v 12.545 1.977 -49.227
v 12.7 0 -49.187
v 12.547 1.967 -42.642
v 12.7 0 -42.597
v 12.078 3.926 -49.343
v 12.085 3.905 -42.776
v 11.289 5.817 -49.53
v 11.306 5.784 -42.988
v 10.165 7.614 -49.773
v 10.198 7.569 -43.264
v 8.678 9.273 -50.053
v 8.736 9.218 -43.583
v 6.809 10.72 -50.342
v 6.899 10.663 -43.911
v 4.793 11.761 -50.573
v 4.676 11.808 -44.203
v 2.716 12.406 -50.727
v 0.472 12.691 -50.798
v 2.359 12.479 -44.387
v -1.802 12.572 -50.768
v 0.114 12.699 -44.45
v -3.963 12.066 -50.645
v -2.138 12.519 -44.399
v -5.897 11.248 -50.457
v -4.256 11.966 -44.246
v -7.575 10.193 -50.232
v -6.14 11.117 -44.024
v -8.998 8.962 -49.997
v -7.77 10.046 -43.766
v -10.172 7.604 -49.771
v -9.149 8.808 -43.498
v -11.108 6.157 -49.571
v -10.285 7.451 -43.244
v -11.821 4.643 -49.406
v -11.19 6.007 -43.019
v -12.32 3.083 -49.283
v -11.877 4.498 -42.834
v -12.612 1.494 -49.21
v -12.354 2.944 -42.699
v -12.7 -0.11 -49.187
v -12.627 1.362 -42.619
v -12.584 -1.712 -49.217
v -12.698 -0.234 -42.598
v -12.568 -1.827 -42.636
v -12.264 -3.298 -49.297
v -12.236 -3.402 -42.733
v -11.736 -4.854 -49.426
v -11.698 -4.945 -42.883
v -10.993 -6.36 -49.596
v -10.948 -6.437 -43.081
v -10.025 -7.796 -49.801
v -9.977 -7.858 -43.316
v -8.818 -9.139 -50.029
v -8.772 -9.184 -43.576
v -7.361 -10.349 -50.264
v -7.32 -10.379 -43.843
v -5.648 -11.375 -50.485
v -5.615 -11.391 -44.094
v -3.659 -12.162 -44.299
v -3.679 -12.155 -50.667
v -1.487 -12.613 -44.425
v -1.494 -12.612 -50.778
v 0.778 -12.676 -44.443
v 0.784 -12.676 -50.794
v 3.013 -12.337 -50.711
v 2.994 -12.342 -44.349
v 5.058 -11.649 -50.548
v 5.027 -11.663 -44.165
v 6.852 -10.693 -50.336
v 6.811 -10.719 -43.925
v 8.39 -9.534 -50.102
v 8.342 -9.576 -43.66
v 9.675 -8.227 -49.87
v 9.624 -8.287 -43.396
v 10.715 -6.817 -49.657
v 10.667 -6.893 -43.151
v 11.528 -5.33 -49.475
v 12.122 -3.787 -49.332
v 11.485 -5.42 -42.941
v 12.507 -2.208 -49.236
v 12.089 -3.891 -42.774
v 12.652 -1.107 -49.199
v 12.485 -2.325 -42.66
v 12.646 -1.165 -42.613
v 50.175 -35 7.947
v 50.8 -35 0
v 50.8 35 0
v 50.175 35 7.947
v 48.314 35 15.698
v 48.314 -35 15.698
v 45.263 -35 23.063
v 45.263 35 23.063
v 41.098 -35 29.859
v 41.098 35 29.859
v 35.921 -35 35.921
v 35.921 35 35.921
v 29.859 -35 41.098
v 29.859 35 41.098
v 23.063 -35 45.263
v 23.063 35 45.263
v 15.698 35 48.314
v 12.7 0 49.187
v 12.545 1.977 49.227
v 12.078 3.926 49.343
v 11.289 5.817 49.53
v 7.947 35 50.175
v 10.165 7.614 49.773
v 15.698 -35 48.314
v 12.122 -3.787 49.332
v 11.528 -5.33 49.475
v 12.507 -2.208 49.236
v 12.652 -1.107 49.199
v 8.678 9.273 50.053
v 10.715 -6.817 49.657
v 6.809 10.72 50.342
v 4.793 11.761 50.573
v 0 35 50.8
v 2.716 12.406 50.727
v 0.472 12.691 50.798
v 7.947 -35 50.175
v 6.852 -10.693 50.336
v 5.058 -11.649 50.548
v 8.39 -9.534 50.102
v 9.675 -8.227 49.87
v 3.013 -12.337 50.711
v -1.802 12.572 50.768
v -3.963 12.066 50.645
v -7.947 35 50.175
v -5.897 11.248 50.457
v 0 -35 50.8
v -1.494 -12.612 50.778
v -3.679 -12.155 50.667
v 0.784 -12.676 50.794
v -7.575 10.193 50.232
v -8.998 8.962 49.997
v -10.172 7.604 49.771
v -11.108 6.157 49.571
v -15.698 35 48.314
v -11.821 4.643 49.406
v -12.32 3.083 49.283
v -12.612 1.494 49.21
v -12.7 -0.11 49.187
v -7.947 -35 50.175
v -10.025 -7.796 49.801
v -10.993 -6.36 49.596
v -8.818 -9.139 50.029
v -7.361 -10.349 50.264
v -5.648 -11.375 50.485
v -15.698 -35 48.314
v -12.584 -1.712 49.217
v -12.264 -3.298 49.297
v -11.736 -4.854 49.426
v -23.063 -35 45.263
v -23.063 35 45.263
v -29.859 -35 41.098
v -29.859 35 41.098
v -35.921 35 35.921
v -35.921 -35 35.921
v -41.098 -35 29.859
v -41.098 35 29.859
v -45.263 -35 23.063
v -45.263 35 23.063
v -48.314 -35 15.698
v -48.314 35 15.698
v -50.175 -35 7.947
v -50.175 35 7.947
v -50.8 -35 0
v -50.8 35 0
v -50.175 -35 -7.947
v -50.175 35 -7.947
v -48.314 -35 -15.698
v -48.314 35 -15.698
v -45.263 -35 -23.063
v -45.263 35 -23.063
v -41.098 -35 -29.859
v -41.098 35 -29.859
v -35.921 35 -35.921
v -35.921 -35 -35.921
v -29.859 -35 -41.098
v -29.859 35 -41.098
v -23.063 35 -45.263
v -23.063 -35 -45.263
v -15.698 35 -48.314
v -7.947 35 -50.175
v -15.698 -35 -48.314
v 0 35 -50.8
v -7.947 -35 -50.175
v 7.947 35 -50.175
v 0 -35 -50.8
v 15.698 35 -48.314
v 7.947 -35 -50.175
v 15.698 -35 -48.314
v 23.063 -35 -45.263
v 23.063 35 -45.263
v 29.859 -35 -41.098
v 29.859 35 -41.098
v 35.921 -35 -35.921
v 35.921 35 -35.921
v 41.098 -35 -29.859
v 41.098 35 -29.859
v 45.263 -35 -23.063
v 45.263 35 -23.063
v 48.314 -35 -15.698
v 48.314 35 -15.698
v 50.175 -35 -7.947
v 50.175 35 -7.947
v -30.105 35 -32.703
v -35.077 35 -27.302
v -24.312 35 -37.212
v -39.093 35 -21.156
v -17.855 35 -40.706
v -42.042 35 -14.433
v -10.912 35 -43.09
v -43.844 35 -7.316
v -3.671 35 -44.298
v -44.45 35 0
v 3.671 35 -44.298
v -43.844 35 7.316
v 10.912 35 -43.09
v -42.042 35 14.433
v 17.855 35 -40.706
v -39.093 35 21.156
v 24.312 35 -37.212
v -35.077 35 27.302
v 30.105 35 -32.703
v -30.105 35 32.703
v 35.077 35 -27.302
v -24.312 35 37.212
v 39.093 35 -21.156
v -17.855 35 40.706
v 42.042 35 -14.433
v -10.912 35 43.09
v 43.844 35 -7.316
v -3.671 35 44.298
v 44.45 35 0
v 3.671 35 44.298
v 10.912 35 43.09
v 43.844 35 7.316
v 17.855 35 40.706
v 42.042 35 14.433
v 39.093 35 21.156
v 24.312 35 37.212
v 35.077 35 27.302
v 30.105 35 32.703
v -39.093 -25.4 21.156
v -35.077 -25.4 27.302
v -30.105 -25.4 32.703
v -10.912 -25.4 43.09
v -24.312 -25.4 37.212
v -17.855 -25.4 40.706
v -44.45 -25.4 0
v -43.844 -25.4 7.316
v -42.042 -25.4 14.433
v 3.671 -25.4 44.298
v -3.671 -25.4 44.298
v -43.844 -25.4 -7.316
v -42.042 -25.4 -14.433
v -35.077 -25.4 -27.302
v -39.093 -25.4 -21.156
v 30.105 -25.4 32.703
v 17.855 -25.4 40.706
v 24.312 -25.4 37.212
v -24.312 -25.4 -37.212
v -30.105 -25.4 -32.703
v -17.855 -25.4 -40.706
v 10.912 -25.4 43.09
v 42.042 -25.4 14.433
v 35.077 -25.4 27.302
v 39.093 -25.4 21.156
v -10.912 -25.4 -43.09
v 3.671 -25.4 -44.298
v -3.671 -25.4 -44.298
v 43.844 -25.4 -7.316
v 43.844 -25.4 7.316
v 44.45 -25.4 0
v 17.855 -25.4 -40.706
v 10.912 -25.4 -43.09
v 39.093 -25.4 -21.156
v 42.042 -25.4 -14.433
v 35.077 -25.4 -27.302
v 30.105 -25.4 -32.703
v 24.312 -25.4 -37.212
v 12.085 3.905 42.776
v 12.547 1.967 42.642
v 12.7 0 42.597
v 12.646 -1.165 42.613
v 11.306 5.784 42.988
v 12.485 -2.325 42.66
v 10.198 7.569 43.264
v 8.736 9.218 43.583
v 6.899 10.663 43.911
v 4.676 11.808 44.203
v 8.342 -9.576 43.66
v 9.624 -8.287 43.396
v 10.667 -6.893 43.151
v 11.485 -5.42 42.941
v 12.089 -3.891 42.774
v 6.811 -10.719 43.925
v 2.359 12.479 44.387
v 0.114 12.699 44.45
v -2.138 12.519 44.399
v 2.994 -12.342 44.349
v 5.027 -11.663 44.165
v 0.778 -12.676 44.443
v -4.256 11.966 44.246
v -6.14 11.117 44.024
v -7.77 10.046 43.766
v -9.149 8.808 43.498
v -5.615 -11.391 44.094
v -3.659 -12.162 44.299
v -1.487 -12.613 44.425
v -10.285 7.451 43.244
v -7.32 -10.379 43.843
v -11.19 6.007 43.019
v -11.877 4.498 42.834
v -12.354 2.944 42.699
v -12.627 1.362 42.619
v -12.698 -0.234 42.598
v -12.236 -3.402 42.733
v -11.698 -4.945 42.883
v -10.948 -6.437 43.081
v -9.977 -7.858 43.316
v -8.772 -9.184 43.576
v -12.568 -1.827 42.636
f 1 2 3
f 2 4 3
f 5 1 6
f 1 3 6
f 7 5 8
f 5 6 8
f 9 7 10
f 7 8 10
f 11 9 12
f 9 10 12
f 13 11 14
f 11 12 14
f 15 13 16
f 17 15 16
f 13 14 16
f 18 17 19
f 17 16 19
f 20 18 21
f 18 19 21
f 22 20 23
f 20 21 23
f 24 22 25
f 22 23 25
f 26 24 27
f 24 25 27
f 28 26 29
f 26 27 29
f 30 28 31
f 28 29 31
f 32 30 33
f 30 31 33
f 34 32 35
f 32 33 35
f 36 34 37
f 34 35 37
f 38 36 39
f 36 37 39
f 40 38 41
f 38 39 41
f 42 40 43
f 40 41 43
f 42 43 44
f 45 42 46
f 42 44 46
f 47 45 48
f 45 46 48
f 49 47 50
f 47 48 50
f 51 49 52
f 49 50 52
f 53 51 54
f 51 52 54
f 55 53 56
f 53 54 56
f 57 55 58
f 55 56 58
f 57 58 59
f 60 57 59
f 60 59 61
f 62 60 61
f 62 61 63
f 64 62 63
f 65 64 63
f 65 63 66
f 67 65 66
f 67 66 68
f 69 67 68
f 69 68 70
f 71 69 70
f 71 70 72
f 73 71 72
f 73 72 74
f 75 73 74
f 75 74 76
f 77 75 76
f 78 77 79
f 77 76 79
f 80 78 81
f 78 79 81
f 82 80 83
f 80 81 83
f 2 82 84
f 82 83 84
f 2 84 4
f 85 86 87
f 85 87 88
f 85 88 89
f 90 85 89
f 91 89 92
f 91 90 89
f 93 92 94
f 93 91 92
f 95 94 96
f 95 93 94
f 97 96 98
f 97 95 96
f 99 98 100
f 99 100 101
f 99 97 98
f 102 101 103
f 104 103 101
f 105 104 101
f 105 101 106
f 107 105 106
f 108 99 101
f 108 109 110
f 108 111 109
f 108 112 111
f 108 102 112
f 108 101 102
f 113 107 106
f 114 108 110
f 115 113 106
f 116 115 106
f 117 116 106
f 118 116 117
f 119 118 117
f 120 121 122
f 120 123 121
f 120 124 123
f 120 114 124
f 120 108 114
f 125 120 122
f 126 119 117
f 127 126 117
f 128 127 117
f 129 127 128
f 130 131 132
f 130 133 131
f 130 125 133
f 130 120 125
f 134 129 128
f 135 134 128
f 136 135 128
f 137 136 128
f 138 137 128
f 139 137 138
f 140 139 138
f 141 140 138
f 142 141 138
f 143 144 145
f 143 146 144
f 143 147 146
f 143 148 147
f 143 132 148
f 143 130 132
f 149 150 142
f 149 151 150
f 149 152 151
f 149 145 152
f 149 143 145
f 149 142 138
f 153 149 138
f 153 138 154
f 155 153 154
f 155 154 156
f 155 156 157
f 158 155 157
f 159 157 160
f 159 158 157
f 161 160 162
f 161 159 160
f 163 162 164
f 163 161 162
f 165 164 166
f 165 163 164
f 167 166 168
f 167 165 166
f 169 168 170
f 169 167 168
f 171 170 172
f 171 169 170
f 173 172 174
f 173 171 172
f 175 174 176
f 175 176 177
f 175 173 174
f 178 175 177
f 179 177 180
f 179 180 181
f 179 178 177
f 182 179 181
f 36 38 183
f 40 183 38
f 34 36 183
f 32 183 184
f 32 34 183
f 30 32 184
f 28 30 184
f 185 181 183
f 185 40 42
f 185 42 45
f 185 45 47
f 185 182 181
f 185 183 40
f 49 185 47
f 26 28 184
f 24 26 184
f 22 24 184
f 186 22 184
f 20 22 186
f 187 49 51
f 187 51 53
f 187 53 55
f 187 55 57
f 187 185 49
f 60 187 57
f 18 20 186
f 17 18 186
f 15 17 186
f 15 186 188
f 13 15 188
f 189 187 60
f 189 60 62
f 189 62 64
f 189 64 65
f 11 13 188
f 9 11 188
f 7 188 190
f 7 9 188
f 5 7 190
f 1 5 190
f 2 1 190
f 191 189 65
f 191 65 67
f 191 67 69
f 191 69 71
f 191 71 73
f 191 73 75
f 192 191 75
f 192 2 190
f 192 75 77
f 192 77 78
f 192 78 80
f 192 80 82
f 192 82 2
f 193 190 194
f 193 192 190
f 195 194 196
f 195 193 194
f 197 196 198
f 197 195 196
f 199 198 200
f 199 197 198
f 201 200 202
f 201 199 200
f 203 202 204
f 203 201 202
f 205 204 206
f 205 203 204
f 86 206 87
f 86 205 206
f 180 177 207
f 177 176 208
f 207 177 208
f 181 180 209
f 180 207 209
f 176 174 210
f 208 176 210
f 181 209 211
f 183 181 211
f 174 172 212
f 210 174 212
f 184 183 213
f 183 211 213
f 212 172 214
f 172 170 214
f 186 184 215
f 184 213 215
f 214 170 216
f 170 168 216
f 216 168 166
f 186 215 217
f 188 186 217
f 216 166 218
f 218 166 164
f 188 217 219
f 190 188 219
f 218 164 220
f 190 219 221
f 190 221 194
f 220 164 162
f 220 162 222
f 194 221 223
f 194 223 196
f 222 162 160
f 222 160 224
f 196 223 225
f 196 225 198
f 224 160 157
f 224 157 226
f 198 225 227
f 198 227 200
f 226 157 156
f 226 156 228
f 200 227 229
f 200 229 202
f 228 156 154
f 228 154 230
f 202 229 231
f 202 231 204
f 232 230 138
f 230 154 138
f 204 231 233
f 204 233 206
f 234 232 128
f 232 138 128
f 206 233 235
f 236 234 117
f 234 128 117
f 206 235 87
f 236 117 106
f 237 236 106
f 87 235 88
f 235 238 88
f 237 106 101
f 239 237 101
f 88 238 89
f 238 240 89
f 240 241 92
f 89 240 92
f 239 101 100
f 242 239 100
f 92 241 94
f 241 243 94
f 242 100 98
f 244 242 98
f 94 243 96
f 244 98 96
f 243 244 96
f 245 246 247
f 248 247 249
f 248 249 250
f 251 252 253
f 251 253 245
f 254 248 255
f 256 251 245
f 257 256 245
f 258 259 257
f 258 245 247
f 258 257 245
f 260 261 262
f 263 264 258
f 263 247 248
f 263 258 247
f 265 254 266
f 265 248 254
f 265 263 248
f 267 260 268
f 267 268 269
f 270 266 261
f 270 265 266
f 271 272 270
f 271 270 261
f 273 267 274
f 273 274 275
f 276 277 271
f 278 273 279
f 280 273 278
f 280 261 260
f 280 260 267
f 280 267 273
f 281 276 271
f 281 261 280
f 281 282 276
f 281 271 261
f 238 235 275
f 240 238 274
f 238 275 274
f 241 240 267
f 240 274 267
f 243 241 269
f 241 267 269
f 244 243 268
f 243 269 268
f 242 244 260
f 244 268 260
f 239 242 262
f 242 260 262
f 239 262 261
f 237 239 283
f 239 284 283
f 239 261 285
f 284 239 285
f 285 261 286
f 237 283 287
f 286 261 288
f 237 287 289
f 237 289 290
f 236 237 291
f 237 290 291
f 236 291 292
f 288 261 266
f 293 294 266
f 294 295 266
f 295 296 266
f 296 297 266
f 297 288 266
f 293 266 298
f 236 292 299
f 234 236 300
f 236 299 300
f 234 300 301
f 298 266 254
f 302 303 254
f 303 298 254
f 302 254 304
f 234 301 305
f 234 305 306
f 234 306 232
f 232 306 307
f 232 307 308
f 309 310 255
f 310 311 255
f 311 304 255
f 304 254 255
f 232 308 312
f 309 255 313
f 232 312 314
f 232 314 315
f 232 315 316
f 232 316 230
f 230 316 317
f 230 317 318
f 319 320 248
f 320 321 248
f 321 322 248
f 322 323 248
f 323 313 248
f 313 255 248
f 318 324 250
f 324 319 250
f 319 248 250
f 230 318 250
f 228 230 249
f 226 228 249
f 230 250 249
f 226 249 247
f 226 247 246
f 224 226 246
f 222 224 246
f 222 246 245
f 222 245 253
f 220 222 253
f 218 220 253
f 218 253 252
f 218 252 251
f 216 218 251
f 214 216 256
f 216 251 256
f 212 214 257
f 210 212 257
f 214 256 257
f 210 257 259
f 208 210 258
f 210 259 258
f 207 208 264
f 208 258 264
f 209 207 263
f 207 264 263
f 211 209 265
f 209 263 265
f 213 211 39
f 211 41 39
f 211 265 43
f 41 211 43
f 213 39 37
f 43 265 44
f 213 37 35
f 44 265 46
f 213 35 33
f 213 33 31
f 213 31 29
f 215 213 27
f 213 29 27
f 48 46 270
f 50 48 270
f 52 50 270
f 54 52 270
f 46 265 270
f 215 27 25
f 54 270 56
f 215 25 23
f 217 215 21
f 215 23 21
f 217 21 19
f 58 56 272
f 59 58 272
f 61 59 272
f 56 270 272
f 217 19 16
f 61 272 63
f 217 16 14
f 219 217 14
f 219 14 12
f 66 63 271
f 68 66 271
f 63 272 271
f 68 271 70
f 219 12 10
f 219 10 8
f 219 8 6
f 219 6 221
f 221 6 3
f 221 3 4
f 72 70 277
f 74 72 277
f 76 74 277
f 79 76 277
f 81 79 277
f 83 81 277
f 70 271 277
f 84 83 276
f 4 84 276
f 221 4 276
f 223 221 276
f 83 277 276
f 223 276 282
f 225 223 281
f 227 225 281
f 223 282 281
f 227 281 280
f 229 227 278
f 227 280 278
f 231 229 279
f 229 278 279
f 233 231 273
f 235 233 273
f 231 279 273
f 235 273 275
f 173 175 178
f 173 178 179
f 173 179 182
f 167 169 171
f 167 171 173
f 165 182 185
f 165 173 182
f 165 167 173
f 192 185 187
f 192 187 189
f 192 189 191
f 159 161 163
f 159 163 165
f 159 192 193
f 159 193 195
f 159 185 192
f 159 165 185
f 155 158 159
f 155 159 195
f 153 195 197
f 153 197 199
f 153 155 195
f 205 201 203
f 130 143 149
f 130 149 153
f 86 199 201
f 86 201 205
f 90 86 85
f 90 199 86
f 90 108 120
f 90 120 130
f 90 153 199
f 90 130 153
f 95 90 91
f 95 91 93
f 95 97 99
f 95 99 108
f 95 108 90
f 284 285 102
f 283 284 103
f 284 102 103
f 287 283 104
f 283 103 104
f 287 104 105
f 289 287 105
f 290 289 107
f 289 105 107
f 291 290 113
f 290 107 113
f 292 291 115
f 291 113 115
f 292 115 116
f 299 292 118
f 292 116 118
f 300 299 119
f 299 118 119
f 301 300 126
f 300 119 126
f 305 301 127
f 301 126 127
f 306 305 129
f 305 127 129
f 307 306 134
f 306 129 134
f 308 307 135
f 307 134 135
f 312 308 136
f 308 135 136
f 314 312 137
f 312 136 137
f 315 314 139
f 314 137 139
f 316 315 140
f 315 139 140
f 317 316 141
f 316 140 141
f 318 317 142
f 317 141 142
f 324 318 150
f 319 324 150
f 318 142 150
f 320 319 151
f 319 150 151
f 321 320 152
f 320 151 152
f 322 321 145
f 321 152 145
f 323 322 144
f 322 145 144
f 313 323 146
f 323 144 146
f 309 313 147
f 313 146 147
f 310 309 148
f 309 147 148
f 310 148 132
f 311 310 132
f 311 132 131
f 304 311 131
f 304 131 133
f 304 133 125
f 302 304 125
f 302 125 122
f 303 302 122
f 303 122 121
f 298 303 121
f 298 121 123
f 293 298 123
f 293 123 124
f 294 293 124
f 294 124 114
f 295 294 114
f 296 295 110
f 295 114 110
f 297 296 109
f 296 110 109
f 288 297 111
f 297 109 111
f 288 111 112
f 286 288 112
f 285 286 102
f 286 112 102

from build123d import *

# Parameters (mm, degrees)
F0_R      = 50.8
F1_DEPTH  = 35
F2_R      = 44.45
F3_DEPTH  = 82.563922
F3_FACE_R = 44.45
F4_DEPTH  = 25.4
F5_R      = 12.7
F6_DEPTH  = 71.218602


with BuildPart() as f1:
    # F0 (on Front) → F1 (new body, symmetric)
    with BuildSketch(Plane.XZ):
        Circle(F0_R)
    extrude(amount=F1_DEPTH, both=True)

    # F2 (on Front) → F3 (cut)
    with BuildSketch(Plane.XZ):
        Circle(F2_R)
    extrude(amount=-F3_DEPTH, mode=Mode.SUBTRACT)

    # F3_face (on face) → F4 (cut)
    with BuildSketch(Plane(origin=(0, 0, 0), x_dir=(1, 0, 0), z_dir=(0, 1, 0))):
        Circle(F3_FACE_R)
    extrude(amount=-F4_DEPTH, mode=Mode.SUBTRACT)

    # F5 (on Top) → F6 (cut, symmetric)
    with BuildSketch(Plane.XY):
        Circle(F5_R)
    extrude(amount=F6_DEPTH, both=True, mode=Mode.SUBTRACT)


solid = f1.part
